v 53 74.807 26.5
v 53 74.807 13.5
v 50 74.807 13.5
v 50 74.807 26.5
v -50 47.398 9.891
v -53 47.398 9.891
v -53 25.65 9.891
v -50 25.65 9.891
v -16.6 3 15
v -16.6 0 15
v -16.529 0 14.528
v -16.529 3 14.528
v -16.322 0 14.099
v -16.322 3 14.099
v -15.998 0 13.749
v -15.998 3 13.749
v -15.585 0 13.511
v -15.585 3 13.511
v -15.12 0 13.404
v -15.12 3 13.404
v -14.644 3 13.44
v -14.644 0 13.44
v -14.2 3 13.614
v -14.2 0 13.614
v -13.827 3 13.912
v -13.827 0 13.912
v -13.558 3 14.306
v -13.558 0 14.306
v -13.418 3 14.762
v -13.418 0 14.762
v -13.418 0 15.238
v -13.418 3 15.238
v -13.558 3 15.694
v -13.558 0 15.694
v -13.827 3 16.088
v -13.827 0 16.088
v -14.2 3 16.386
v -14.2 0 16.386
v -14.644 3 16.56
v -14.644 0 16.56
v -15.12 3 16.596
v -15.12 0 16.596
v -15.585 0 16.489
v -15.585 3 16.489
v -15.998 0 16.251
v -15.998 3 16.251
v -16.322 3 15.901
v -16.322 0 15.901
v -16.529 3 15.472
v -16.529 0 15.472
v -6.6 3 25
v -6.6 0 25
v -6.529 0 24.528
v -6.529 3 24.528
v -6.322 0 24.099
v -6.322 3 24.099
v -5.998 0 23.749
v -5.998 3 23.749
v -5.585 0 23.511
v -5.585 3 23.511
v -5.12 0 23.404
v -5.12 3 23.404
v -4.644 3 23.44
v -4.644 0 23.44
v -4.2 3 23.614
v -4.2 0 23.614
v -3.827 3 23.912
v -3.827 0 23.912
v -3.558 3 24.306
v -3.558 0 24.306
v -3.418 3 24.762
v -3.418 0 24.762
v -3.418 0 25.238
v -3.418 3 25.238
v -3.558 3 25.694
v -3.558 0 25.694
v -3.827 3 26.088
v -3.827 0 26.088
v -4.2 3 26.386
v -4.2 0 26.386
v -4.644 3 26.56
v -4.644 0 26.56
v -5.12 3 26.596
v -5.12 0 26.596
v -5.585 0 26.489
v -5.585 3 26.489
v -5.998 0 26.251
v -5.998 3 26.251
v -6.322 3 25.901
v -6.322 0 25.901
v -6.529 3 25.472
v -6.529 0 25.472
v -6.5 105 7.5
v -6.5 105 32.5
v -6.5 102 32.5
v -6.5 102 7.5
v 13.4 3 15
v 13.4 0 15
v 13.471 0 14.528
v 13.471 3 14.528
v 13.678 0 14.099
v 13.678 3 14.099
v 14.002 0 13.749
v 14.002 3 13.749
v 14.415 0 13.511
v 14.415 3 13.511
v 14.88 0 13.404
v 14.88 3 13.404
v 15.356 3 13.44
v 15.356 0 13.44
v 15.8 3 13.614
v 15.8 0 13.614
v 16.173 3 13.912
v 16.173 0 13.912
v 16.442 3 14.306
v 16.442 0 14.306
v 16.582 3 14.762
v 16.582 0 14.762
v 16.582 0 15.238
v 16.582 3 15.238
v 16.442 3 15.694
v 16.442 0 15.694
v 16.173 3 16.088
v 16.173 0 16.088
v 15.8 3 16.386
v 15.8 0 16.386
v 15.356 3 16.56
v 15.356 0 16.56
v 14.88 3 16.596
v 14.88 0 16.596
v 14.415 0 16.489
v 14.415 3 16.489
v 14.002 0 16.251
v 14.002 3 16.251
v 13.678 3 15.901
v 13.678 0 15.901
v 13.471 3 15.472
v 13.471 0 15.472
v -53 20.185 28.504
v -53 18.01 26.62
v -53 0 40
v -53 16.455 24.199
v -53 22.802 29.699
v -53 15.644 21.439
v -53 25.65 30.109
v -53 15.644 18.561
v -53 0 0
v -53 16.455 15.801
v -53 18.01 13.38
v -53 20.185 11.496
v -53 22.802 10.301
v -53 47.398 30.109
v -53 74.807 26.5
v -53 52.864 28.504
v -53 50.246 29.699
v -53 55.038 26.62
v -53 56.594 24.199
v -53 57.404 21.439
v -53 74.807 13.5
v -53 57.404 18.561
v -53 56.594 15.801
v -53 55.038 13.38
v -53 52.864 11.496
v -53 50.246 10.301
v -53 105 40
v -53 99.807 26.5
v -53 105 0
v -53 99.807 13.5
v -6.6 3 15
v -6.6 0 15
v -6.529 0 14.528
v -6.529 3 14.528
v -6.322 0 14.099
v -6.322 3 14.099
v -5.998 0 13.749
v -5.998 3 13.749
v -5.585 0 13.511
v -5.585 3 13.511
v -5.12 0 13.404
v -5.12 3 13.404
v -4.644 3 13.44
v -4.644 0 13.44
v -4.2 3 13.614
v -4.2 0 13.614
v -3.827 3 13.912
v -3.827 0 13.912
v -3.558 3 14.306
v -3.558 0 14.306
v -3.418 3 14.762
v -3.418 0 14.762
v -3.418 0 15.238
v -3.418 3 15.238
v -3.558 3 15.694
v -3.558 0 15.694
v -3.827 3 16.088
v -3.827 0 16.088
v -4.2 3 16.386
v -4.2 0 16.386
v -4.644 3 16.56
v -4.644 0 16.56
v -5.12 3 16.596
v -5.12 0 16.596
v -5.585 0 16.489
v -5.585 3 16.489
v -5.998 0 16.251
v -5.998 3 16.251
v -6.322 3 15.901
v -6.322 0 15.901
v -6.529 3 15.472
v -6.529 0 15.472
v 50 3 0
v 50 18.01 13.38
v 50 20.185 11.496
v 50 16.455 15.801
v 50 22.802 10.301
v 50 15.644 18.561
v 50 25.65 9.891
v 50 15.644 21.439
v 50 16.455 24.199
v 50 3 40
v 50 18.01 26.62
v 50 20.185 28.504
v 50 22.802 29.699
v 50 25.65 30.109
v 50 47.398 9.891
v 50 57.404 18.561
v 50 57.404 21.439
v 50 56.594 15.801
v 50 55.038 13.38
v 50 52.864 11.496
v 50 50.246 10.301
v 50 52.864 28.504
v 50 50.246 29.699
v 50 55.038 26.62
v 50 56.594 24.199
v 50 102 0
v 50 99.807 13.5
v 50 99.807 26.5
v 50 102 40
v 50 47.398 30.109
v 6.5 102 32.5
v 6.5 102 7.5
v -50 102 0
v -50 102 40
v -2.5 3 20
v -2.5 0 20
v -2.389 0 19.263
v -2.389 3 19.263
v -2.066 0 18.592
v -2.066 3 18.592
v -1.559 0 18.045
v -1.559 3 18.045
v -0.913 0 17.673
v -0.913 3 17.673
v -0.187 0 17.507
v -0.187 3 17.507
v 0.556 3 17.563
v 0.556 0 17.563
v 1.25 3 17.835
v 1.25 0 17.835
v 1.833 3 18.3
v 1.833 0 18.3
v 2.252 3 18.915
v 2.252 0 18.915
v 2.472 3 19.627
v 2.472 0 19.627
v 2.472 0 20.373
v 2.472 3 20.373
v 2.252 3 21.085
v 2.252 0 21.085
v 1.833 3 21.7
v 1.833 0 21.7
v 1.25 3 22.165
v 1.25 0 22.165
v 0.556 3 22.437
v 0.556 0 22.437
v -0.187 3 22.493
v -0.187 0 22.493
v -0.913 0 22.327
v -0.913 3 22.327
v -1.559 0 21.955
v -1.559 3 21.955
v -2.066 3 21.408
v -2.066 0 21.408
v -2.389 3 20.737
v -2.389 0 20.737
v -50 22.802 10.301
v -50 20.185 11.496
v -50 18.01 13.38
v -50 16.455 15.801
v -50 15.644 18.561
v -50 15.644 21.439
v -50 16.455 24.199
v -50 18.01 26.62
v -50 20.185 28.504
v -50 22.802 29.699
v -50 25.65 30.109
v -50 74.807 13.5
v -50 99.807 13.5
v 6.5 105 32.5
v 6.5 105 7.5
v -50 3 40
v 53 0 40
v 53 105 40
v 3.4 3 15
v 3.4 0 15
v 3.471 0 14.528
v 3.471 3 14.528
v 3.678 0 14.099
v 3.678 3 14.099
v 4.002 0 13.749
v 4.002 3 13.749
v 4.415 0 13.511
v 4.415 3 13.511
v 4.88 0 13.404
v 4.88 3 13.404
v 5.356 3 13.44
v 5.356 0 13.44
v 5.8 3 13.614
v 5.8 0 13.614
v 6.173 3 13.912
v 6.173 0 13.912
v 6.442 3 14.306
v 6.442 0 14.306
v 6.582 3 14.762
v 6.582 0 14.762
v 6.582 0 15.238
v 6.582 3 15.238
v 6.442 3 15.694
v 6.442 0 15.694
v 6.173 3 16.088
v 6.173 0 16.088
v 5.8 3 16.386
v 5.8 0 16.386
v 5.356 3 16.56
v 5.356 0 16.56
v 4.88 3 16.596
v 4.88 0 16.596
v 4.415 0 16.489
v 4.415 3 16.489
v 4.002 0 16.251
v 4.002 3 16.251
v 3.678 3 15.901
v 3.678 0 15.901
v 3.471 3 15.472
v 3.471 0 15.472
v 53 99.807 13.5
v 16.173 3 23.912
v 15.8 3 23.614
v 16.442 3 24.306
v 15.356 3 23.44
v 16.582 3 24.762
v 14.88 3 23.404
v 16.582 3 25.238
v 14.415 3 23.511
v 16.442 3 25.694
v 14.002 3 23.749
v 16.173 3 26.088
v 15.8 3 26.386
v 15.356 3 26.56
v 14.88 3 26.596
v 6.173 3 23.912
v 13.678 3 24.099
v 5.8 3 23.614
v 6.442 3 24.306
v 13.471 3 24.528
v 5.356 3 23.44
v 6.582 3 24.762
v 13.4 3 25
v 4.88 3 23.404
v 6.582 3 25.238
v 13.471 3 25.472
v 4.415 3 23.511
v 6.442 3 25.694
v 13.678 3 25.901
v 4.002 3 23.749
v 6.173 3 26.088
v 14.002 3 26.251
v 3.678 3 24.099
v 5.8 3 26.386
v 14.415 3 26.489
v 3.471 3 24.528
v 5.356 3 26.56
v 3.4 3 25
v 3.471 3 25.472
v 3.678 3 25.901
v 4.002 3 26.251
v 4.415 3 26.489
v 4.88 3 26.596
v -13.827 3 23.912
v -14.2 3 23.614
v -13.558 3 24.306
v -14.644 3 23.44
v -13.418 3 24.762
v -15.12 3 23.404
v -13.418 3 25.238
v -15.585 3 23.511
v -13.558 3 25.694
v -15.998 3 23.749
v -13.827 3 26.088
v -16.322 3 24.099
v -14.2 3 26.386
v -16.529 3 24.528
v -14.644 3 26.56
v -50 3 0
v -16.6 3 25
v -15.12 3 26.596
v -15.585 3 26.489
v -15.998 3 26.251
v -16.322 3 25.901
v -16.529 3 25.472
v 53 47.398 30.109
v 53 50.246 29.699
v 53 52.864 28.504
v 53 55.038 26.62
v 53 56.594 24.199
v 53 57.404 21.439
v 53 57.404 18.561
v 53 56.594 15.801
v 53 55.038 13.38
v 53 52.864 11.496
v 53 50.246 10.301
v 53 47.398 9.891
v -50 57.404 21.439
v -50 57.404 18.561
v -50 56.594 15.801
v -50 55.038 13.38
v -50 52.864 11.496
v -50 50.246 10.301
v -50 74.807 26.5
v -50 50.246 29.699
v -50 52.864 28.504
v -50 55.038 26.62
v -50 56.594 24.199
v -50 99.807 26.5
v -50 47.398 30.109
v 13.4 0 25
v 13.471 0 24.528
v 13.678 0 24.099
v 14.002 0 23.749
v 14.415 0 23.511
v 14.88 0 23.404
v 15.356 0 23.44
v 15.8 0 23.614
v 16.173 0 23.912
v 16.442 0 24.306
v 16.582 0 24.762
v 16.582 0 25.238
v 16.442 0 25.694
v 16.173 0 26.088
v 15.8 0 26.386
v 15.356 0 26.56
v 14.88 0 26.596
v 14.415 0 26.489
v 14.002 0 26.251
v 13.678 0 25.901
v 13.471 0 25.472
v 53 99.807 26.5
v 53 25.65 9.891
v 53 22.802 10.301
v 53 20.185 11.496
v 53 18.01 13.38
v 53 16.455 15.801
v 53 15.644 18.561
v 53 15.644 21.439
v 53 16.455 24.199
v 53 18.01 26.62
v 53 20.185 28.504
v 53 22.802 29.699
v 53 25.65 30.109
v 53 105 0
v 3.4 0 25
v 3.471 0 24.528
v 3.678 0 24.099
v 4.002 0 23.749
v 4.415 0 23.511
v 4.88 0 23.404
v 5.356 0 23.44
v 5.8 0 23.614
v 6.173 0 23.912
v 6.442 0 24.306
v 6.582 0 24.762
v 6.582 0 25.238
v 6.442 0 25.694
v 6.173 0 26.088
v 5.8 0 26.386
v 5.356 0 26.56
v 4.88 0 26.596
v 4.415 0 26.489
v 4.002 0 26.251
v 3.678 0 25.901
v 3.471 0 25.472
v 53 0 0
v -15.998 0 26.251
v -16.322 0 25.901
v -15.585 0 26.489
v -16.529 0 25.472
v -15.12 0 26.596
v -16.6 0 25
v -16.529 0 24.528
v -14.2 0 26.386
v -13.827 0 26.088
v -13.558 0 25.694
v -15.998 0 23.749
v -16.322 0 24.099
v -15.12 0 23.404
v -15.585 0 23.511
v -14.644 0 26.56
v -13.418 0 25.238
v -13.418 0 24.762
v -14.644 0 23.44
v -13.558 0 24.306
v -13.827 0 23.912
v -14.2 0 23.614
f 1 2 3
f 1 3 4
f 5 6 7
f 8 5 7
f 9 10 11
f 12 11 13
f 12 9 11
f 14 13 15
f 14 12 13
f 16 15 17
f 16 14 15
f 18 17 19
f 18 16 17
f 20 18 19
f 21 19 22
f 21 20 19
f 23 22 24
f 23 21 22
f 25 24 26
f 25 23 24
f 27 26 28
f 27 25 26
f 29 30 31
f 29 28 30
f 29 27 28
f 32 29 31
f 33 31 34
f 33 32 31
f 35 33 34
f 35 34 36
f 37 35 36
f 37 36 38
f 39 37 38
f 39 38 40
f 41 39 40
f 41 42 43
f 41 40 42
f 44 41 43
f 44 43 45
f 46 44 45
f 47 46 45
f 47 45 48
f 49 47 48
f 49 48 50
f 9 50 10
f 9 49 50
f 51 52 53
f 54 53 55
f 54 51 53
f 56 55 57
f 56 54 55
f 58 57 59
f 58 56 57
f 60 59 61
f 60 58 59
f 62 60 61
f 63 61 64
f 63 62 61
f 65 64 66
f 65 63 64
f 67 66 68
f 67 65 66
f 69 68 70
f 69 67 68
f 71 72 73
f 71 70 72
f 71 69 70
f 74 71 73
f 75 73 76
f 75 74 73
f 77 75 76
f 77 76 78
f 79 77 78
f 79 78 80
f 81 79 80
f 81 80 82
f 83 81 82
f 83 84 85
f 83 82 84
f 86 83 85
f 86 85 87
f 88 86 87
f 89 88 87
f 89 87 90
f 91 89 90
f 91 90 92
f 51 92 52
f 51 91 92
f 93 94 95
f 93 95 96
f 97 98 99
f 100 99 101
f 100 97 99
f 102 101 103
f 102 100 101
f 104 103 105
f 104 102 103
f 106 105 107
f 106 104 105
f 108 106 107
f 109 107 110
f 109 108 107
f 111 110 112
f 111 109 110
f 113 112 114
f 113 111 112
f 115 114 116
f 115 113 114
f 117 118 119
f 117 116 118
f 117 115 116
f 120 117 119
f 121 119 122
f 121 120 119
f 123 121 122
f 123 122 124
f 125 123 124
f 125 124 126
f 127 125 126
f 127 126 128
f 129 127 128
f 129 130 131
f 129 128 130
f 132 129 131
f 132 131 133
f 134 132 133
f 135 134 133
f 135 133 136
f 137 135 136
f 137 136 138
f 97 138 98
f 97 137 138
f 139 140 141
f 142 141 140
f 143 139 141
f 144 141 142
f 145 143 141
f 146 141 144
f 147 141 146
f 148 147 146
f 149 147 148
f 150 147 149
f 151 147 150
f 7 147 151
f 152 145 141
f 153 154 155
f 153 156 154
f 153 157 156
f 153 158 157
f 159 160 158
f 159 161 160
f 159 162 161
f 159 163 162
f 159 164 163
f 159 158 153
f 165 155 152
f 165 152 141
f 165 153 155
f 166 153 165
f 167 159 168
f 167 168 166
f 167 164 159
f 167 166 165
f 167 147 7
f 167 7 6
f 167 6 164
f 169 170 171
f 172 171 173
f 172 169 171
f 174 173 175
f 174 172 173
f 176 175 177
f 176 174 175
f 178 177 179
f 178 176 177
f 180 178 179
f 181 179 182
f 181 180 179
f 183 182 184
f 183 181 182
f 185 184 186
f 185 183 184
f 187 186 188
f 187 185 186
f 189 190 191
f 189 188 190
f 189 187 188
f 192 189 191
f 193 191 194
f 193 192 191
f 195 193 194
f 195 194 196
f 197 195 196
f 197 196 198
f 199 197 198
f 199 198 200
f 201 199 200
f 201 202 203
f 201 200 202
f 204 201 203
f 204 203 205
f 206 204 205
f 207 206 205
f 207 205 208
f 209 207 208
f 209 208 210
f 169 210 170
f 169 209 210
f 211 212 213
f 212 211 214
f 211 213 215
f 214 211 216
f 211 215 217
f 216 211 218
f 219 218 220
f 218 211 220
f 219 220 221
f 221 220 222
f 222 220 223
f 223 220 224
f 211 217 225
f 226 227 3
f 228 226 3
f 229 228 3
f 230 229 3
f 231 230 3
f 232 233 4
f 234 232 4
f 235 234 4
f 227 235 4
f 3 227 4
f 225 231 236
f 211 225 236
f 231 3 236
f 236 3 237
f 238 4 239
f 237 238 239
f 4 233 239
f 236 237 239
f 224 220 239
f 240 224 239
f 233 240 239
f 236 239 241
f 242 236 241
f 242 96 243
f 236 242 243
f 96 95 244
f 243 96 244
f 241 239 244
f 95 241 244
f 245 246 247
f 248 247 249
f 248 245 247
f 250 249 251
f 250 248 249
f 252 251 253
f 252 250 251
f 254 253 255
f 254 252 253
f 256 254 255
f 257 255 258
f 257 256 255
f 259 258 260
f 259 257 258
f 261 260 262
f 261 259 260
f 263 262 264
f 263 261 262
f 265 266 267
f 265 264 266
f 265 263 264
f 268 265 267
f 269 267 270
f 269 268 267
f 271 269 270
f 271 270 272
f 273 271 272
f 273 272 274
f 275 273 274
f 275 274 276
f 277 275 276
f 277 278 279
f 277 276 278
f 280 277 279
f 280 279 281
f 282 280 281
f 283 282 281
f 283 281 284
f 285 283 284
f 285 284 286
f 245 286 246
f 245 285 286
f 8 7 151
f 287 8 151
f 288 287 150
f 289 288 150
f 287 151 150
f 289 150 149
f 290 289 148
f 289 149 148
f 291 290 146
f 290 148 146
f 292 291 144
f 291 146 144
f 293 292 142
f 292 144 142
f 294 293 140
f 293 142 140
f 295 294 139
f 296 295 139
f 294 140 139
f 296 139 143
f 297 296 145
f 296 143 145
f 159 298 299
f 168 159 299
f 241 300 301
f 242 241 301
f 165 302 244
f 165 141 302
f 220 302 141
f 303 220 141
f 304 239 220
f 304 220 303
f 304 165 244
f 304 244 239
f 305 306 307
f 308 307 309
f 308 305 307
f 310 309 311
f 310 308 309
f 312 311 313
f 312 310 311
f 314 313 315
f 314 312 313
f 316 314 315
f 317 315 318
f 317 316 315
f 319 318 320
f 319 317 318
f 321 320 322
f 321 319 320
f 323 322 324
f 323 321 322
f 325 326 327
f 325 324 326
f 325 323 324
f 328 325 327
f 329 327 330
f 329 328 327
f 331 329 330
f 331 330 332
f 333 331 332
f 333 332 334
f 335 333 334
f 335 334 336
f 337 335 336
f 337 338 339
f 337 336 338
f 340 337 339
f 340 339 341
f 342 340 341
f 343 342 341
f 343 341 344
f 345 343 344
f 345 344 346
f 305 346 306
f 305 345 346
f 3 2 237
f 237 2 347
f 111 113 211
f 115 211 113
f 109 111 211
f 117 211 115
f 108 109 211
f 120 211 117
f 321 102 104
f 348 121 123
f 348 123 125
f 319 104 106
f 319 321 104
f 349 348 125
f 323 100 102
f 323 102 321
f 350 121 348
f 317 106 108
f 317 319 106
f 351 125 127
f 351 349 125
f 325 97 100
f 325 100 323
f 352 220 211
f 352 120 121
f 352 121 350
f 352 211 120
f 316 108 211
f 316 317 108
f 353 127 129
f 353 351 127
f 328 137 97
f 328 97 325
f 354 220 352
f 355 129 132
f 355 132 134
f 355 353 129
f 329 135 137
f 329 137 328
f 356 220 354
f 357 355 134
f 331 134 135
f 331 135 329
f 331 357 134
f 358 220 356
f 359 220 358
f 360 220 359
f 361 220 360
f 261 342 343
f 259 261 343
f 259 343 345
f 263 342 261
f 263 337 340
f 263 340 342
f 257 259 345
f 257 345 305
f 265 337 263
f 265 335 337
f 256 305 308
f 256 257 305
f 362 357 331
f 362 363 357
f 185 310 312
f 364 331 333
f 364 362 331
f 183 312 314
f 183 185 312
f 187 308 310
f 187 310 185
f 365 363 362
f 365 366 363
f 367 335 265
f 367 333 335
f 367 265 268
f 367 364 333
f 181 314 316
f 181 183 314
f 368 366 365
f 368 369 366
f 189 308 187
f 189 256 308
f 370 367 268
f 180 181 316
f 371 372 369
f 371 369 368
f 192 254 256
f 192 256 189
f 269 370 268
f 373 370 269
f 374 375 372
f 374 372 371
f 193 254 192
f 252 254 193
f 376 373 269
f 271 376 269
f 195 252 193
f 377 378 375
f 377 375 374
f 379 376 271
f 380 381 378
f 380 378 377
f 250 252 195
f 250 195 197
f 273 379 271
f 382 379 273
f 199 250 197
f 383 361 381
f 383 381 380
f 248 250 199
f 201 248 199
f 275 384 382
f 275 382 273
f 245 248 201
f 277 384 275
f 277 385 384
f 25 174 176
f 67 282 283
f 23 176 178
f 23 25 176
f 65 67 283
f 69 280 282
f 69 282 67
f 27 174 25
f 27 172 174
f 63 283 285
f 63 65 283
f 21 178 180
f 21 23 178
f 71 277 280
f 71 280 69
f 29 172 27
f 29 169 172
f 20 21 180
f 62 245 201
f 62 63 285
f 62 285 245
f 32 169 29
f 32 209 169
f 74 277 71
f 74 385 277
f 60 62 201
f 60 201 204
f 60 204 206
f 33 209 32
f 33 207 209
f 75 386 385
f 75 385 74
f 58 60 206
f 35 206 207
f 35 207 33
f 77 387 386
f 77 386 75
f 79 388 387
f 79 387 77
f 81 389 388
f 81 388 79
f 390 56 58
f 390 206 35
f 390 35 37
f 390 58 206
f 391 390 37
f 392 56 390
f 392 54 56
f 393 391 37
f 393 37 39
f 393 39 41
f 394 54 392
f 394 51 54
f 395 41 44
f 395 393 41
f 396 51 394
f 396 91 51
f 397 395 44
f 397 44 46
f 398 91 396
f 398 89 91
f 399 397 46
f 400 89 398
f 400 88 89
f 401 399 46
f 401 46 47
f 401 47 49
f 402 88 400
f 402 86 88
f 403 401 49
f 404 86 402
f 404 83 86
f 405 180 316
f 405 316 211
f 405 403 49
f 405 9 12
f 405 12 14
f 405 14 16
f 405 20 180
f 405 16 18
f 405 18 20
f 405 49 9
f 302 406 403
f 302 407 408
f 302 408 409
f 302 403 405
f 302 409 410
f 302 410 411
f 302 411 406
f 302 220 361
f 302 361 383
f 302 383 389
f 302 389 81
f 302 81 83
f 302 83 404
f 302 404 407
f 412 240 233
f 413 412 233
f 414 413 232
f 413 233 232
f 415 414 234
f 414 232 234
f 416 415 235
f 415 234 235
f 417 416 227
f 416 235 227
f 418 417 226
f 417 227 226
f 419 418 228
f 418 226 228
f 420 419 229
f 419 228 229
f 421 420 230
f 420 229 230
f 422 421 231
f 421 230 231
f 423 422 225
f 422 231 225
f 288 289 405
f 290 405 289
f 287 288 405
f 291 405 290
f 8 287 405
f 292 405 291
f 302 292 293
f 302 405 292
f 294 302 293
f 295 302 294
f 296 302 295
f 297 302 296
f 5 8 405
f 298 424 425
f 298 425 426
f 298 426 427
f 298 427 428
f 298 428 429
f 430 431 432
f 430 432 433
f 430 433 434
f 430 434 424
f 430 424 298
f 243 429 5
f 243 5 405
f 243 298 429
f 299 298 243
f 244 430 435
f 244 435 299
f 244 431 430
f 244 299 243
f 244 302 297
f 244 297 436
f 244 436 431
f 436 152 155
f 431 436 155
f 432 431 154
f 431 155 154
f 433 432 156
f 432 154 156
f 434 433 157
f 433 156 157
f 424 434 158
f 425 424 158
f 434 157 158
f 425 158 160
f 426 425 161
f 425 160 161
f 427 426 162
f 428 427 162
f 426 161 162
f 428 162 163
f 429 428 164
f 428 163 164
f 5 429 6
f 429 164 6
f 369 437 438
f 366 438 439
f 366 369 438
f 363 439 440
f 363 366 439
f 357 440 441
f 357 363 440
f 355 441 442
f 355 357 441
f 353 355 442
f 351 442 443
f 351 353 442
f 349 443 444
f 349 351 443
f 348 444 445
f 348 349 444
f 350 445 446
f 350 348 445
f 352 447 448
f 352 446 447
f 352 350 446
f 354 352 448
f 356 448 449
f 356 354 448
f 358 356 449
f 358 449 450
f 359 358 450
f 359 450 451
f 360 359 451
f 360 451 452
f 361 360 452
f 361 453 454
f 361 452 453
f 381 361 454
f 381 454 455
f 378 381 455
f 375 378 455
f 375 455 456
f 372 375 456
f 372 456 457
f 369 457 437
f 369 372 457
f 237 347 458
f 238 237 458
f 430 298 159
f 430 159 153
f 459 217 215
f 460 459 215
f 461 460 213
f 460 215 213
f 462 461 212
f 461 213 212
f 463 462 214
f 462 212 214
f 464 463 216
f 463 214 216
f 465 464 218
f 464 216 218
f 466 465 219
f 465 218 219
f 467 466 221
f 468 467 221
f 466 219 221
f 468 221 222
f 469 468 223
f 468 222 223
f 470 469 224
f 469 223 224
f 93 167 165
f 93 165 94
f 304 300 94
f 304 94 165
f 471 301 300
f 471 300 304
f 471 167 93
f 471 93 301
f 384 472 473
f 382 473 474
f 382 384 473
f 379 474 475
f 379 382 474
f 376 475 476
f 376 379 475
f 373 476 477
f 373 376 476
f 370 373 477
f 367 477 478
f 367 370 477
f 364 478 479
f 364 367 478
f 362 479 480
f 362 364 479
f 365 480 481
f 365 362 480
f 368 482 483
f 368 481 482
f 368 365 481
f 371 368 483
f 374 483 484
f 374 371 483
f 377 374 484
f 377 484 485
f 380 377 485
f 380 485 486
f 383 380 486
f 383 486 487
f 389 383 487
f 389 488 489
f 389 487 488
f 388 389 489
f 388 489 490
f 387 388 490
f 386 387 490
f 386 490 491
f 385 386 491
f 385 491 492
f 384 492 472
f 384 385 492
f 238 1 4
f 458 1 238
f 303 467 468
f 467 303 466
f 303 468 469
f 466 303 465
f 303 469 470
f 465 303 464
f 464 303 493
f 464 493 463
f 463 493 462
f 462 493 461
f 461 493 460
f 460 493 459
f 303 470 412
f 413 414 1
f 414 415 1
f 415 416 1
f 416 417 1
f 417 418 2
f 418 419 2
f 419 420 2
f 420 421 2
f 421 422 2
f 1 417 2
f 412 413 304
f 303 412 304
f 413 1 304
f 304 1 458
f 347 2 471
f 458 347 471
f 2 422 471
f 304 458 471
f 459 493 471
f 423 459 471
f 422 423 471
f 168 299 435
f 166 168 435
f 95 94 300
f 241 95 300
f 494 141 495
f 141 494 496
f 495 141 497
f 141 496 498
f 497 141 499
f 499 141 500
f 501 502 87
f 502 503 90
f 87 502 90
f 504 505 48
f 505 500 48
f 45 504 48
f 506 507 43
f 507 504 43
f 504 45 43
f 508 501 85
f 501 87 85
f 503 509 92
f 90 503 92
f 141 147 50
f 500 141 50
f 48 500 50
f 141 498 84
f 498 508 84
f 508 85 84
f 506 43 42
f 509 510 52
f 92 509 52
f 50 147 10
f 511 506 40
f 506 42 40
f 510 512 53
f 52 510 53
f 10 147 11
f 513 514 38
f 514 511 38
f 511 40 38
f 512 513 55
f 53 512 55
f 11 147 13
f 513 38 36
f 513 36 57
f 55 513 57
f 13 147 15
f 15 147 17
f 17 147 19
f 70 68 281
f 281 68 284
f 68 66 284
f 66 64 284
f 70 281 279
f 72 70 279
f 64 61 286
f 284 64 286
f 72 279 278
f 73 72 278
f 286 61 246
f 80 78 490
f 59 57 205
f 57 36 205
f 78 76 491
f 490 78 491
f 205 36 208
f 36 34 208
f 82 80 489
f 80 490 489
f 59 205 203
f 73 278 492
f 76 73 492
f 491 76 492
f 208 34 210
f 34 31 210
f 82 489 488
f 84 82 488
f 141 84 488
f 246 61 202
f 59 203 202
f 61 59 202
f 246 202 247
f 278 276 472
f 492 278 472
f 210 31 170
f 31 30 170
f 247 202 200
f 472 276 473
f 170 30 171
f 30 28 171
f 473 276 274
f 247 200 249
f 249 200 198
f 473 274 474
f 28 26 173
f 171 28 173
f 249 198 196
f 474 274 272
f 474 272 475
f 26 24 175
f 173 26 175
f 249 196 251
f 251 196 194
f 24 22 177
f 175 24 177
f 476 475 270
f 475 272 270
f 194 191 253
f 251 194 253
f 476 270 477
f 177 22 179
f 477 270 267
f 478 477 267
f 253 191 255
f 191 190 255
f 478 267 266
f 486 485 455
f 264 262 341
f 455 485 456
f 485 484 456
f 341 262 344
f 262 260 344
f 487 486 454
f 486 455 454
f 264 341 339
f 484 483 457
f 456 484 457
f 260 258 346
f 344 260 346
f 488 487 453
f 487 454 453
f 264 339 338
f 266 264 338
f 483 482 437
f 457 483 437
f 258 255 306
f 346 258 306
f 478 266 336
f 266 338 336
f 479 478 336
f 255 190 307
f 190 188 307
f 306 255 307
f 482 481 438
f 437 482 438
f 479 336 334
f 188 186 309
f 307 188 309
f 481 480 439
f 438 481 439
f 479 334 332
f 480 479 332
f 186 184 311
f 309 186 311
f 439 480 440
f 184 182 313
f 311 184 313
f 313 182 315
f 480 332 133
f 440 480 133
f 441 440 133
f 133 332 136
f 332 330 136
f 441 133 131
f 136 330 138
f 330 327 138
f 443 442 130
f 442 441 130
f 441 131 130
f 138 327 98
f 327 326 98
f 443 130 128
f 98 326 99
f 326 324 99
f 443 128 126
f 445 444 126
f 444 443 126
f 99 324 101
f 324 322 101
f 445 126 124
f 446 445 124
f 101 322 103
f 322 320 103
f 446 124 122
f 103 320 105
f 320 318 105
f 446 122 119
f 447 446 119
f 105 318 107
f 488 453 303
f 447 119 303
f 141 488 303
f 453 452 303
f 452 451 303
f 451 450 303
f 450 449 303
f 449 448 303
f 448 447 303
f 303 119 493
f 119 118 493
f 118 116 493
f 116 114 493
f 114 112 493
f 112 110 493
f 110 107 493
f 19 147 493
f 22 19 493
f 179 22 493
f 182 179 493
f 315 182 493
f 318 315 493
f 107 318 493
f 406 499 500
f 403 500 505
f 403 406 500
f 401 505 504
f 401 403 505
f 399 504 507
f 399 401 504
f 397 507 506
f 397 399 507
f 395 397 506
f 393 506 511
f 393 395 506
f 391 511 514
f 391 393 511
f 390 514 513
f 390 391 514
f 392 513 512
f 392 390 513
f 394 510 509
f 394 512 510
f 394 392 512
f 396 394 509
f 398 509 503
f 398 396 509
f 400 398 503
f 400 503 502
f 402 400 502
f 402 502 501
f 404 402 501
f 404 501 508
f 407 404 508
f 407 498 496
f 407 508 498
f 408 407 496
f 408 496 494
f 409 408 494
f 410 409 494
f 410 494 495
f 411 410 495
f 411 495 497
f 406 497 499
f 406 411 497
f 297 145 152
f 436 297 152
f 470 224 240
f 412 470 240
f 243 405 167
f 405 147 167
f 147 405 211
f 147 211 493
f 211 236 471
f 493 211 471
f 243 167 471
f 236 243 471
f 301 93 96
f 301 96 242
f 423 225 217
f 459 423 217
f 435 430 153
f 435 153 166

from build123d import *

# Parameters (mm, degrees)
SKETCH_1_W                      = 106
SKETCH_1_H                      = 105
EXTRUDE_1_DEPTH                 = 40
CUT_EXTRUDE_1_DEPTH             = 125.233650836
CUT_EXTRUDE_1_DEPTH_BACK        = 125.233650836
SKETCH_3_W                      = 100
SKETCH_3_H                      = 99
CUT_EXTRUDE_3_DEPTH             = 1
CUT_EXTRUDE_3_DEPTH_BACK        = 3
SKETCH_7_R                      = 2.5
SKETCH_7_R_2                    = 1.6
CUT_EXTRUDE_4_REACH             = 126.234
SKETCH_6_W                      = 13
SKETCH_6_H                      = 25
CUT_EXTRUDE_4_DIRECTION_2_DEPTH = 125.233650836
CUT_EXTRUDE_5_DEPTH             = 155.470061824
CUT_EXTRUDE_5_DEPTH_BACK        = 155.470061824
SKETCH_10_W                     = 13
SKETCH_10_H                     = 25
CUT_EXTRUDE_6_DEPTH             = 155.470061824
CUT_EXTRUDE_6_DEPTH_BACK        = 155.470061824


with BuildPart() as part:
    # 草图1 → 凸台-拉伸1 (new body)
    with BuildSketch(Plane.XY):
        with Locations((0, 52.5)):
            Rectangle(SKETCH_1_W, SKETCH_1_H)
    extrude(amount=EXTRUDE_1_DEPTH)

    # 草图3 → 切除-拉伸1 (cut, two sides: drawn at the far end of the back side and taken through both)
    with BuildSketch(Plane(origin=(0, 0, 0), x_dir=(-1, 0, 0), z_dir=(0, 0, -1)).offset(-CUT_EXTRUDE_1_DEPTH_BACK)):
        with Locations((0, 52.5)):
            Rectangle(SKETCH_3_W, SKETCH_3_H)
    extrude(amount=CUT_EXTRUDE_1_DEPTH + CUT_EXTRUDE_1_DEPTH_BACK, mode=Mode.SUBTRACT)

    # 草图7 → 切除-拉伸3 (cut, two sides: drawn at the far end of the back side and taken through both)
    with BuildSketch(Plane.XZ.offset(-CUT_EXTRUDE_3_DEPTH_BACK)):
        with Locations(Location((0, 20, 0), (0, 0, 180))):
            Circle(SKETCH_7_R)
        with Locations(Location((5, 25, 0), (0, 0, 180))):
            Circle(SKETCH_7_R_2)
        with Locations(Location((5, 15, 0), (0, 0, 180))):
            Circle(SKETCH_7_R_2)
        with Locations(Location((-5, 15, 0), (0, 0, 180))):
            Circle(SKETCH_7_R_2)
        with Locations(Location((-5, 25, 0), (0, 0, 180))):
            Circle(SKETCH_7_R_2)
        with Locations(Location((15, 25, 0), (0, 0, 180))):
            Circle(SKETCH_7_R_2)
        with Locations(Location((-15, 25, 0), (0, 0, 180))):
            Circle(SKETCH_7_R_2)
        with Locations(Location((15, 15, 0), (0, 0, 180))):
            Circle(SKETCH_7_R_2)
        with Locations(Location((-15, 15, 0), (0, 0, 180))):
            Circle(SKETCH_7_R_2)
    extrude(amount=CUT_EXTRUDE_3_DEPTH + CUT_EXTRUDE_3_DEPTH_BACK, mode=Mode.SUBTRACT)

    # 草图6 → 切除-拉伸4 (cut, up to next)
    with BuildSketch(Plane(origin=(0, 105, 0), x_dir=(1, 0, 0), z_dir=(0, 1, 0)), mode=Mode.PRIVATE) as cut_extrude_4_sk1:
        with Locations((0, -20)):
            Rectangle(SKETCH_6_W, SKETCH_6_H)
    cut_extrude_4_tool1 = extrude(cut_extrude_4_sk1.sketch, amount=-CUT_EXTRUDE_4_REACH, mode=Mode.PRIVATE) & part.part
    add(cut_extrude_4_tool1.solids().sort_by_distance((0, 105, 20))[0], mode=Mode.SUBTRACT)

    # 草图6 → 切除-拉伸4 direction 2 (cut)
    with BuildSketch(Plane(origin=(0, 105, 0), x_dir=(1, 0, 0), z_dir=(0, 1, 0))):
        with Locations((0, -20)):
            Rectangle(SKETCH_6_W, SKETCH_6_H)
    extrude(amount=CUT_EXTRUDE_4_DIRECTION_2_DEPTH, mode=Mode.SUBTRACT)

    # 草图10 → 切除-拉伸5 (cut, two sides: drawn at the far end of the back side and taken through both)
    with BuildSketch(Plane.ZY.offset(53).offset(-CUT_EXTRUDE_5_DEPTH_BACK)):
        with Locations((20, 87.306952357)):
            Rectangle(SKETCH_10_W, SKETCH_10_H)
    extrude(amount=CUT_EXTRUDE_5_DEPTH + CUT_EXTRUDE_5_DEPTH_BACK, mode=Mode.SUBTRACT)

    # 草图12 → 切除-拉伸6 (cut, two sides: drawn at the far end of the back side and taken through both)
    with BuildSketch(Plane(origin=(53, 0, 0), x_dir=(0, 0, -1), z_dir=(1, 0, 0)).offset(-CUT_EXTRUDE_6_DEPTH_BACK)):
        with BuildLine():
            Line((-30.108588081, 25.649961527), (-30.108588081, 47.398469004))
            ThreePointArc((-30.108588081, 47.398469004), (-20, 57.507057086), (-9.891411919, 47.398469004))
            Line((-9.891411919, 47.398469004), (-9.891411919, 25.649961527))
            ThreePointArc((-9.891411919, 25.649961527), (-20, 15.541373446), (-30.108588081, 25.649961527))
        make_face()
    extrude(amount=CUT_EXTRUDE_6_DEPTH + CUT_EXTRUDE_6_DEPTH_BACK, mode=Mode.SUBTRACT)


solid = part.part
